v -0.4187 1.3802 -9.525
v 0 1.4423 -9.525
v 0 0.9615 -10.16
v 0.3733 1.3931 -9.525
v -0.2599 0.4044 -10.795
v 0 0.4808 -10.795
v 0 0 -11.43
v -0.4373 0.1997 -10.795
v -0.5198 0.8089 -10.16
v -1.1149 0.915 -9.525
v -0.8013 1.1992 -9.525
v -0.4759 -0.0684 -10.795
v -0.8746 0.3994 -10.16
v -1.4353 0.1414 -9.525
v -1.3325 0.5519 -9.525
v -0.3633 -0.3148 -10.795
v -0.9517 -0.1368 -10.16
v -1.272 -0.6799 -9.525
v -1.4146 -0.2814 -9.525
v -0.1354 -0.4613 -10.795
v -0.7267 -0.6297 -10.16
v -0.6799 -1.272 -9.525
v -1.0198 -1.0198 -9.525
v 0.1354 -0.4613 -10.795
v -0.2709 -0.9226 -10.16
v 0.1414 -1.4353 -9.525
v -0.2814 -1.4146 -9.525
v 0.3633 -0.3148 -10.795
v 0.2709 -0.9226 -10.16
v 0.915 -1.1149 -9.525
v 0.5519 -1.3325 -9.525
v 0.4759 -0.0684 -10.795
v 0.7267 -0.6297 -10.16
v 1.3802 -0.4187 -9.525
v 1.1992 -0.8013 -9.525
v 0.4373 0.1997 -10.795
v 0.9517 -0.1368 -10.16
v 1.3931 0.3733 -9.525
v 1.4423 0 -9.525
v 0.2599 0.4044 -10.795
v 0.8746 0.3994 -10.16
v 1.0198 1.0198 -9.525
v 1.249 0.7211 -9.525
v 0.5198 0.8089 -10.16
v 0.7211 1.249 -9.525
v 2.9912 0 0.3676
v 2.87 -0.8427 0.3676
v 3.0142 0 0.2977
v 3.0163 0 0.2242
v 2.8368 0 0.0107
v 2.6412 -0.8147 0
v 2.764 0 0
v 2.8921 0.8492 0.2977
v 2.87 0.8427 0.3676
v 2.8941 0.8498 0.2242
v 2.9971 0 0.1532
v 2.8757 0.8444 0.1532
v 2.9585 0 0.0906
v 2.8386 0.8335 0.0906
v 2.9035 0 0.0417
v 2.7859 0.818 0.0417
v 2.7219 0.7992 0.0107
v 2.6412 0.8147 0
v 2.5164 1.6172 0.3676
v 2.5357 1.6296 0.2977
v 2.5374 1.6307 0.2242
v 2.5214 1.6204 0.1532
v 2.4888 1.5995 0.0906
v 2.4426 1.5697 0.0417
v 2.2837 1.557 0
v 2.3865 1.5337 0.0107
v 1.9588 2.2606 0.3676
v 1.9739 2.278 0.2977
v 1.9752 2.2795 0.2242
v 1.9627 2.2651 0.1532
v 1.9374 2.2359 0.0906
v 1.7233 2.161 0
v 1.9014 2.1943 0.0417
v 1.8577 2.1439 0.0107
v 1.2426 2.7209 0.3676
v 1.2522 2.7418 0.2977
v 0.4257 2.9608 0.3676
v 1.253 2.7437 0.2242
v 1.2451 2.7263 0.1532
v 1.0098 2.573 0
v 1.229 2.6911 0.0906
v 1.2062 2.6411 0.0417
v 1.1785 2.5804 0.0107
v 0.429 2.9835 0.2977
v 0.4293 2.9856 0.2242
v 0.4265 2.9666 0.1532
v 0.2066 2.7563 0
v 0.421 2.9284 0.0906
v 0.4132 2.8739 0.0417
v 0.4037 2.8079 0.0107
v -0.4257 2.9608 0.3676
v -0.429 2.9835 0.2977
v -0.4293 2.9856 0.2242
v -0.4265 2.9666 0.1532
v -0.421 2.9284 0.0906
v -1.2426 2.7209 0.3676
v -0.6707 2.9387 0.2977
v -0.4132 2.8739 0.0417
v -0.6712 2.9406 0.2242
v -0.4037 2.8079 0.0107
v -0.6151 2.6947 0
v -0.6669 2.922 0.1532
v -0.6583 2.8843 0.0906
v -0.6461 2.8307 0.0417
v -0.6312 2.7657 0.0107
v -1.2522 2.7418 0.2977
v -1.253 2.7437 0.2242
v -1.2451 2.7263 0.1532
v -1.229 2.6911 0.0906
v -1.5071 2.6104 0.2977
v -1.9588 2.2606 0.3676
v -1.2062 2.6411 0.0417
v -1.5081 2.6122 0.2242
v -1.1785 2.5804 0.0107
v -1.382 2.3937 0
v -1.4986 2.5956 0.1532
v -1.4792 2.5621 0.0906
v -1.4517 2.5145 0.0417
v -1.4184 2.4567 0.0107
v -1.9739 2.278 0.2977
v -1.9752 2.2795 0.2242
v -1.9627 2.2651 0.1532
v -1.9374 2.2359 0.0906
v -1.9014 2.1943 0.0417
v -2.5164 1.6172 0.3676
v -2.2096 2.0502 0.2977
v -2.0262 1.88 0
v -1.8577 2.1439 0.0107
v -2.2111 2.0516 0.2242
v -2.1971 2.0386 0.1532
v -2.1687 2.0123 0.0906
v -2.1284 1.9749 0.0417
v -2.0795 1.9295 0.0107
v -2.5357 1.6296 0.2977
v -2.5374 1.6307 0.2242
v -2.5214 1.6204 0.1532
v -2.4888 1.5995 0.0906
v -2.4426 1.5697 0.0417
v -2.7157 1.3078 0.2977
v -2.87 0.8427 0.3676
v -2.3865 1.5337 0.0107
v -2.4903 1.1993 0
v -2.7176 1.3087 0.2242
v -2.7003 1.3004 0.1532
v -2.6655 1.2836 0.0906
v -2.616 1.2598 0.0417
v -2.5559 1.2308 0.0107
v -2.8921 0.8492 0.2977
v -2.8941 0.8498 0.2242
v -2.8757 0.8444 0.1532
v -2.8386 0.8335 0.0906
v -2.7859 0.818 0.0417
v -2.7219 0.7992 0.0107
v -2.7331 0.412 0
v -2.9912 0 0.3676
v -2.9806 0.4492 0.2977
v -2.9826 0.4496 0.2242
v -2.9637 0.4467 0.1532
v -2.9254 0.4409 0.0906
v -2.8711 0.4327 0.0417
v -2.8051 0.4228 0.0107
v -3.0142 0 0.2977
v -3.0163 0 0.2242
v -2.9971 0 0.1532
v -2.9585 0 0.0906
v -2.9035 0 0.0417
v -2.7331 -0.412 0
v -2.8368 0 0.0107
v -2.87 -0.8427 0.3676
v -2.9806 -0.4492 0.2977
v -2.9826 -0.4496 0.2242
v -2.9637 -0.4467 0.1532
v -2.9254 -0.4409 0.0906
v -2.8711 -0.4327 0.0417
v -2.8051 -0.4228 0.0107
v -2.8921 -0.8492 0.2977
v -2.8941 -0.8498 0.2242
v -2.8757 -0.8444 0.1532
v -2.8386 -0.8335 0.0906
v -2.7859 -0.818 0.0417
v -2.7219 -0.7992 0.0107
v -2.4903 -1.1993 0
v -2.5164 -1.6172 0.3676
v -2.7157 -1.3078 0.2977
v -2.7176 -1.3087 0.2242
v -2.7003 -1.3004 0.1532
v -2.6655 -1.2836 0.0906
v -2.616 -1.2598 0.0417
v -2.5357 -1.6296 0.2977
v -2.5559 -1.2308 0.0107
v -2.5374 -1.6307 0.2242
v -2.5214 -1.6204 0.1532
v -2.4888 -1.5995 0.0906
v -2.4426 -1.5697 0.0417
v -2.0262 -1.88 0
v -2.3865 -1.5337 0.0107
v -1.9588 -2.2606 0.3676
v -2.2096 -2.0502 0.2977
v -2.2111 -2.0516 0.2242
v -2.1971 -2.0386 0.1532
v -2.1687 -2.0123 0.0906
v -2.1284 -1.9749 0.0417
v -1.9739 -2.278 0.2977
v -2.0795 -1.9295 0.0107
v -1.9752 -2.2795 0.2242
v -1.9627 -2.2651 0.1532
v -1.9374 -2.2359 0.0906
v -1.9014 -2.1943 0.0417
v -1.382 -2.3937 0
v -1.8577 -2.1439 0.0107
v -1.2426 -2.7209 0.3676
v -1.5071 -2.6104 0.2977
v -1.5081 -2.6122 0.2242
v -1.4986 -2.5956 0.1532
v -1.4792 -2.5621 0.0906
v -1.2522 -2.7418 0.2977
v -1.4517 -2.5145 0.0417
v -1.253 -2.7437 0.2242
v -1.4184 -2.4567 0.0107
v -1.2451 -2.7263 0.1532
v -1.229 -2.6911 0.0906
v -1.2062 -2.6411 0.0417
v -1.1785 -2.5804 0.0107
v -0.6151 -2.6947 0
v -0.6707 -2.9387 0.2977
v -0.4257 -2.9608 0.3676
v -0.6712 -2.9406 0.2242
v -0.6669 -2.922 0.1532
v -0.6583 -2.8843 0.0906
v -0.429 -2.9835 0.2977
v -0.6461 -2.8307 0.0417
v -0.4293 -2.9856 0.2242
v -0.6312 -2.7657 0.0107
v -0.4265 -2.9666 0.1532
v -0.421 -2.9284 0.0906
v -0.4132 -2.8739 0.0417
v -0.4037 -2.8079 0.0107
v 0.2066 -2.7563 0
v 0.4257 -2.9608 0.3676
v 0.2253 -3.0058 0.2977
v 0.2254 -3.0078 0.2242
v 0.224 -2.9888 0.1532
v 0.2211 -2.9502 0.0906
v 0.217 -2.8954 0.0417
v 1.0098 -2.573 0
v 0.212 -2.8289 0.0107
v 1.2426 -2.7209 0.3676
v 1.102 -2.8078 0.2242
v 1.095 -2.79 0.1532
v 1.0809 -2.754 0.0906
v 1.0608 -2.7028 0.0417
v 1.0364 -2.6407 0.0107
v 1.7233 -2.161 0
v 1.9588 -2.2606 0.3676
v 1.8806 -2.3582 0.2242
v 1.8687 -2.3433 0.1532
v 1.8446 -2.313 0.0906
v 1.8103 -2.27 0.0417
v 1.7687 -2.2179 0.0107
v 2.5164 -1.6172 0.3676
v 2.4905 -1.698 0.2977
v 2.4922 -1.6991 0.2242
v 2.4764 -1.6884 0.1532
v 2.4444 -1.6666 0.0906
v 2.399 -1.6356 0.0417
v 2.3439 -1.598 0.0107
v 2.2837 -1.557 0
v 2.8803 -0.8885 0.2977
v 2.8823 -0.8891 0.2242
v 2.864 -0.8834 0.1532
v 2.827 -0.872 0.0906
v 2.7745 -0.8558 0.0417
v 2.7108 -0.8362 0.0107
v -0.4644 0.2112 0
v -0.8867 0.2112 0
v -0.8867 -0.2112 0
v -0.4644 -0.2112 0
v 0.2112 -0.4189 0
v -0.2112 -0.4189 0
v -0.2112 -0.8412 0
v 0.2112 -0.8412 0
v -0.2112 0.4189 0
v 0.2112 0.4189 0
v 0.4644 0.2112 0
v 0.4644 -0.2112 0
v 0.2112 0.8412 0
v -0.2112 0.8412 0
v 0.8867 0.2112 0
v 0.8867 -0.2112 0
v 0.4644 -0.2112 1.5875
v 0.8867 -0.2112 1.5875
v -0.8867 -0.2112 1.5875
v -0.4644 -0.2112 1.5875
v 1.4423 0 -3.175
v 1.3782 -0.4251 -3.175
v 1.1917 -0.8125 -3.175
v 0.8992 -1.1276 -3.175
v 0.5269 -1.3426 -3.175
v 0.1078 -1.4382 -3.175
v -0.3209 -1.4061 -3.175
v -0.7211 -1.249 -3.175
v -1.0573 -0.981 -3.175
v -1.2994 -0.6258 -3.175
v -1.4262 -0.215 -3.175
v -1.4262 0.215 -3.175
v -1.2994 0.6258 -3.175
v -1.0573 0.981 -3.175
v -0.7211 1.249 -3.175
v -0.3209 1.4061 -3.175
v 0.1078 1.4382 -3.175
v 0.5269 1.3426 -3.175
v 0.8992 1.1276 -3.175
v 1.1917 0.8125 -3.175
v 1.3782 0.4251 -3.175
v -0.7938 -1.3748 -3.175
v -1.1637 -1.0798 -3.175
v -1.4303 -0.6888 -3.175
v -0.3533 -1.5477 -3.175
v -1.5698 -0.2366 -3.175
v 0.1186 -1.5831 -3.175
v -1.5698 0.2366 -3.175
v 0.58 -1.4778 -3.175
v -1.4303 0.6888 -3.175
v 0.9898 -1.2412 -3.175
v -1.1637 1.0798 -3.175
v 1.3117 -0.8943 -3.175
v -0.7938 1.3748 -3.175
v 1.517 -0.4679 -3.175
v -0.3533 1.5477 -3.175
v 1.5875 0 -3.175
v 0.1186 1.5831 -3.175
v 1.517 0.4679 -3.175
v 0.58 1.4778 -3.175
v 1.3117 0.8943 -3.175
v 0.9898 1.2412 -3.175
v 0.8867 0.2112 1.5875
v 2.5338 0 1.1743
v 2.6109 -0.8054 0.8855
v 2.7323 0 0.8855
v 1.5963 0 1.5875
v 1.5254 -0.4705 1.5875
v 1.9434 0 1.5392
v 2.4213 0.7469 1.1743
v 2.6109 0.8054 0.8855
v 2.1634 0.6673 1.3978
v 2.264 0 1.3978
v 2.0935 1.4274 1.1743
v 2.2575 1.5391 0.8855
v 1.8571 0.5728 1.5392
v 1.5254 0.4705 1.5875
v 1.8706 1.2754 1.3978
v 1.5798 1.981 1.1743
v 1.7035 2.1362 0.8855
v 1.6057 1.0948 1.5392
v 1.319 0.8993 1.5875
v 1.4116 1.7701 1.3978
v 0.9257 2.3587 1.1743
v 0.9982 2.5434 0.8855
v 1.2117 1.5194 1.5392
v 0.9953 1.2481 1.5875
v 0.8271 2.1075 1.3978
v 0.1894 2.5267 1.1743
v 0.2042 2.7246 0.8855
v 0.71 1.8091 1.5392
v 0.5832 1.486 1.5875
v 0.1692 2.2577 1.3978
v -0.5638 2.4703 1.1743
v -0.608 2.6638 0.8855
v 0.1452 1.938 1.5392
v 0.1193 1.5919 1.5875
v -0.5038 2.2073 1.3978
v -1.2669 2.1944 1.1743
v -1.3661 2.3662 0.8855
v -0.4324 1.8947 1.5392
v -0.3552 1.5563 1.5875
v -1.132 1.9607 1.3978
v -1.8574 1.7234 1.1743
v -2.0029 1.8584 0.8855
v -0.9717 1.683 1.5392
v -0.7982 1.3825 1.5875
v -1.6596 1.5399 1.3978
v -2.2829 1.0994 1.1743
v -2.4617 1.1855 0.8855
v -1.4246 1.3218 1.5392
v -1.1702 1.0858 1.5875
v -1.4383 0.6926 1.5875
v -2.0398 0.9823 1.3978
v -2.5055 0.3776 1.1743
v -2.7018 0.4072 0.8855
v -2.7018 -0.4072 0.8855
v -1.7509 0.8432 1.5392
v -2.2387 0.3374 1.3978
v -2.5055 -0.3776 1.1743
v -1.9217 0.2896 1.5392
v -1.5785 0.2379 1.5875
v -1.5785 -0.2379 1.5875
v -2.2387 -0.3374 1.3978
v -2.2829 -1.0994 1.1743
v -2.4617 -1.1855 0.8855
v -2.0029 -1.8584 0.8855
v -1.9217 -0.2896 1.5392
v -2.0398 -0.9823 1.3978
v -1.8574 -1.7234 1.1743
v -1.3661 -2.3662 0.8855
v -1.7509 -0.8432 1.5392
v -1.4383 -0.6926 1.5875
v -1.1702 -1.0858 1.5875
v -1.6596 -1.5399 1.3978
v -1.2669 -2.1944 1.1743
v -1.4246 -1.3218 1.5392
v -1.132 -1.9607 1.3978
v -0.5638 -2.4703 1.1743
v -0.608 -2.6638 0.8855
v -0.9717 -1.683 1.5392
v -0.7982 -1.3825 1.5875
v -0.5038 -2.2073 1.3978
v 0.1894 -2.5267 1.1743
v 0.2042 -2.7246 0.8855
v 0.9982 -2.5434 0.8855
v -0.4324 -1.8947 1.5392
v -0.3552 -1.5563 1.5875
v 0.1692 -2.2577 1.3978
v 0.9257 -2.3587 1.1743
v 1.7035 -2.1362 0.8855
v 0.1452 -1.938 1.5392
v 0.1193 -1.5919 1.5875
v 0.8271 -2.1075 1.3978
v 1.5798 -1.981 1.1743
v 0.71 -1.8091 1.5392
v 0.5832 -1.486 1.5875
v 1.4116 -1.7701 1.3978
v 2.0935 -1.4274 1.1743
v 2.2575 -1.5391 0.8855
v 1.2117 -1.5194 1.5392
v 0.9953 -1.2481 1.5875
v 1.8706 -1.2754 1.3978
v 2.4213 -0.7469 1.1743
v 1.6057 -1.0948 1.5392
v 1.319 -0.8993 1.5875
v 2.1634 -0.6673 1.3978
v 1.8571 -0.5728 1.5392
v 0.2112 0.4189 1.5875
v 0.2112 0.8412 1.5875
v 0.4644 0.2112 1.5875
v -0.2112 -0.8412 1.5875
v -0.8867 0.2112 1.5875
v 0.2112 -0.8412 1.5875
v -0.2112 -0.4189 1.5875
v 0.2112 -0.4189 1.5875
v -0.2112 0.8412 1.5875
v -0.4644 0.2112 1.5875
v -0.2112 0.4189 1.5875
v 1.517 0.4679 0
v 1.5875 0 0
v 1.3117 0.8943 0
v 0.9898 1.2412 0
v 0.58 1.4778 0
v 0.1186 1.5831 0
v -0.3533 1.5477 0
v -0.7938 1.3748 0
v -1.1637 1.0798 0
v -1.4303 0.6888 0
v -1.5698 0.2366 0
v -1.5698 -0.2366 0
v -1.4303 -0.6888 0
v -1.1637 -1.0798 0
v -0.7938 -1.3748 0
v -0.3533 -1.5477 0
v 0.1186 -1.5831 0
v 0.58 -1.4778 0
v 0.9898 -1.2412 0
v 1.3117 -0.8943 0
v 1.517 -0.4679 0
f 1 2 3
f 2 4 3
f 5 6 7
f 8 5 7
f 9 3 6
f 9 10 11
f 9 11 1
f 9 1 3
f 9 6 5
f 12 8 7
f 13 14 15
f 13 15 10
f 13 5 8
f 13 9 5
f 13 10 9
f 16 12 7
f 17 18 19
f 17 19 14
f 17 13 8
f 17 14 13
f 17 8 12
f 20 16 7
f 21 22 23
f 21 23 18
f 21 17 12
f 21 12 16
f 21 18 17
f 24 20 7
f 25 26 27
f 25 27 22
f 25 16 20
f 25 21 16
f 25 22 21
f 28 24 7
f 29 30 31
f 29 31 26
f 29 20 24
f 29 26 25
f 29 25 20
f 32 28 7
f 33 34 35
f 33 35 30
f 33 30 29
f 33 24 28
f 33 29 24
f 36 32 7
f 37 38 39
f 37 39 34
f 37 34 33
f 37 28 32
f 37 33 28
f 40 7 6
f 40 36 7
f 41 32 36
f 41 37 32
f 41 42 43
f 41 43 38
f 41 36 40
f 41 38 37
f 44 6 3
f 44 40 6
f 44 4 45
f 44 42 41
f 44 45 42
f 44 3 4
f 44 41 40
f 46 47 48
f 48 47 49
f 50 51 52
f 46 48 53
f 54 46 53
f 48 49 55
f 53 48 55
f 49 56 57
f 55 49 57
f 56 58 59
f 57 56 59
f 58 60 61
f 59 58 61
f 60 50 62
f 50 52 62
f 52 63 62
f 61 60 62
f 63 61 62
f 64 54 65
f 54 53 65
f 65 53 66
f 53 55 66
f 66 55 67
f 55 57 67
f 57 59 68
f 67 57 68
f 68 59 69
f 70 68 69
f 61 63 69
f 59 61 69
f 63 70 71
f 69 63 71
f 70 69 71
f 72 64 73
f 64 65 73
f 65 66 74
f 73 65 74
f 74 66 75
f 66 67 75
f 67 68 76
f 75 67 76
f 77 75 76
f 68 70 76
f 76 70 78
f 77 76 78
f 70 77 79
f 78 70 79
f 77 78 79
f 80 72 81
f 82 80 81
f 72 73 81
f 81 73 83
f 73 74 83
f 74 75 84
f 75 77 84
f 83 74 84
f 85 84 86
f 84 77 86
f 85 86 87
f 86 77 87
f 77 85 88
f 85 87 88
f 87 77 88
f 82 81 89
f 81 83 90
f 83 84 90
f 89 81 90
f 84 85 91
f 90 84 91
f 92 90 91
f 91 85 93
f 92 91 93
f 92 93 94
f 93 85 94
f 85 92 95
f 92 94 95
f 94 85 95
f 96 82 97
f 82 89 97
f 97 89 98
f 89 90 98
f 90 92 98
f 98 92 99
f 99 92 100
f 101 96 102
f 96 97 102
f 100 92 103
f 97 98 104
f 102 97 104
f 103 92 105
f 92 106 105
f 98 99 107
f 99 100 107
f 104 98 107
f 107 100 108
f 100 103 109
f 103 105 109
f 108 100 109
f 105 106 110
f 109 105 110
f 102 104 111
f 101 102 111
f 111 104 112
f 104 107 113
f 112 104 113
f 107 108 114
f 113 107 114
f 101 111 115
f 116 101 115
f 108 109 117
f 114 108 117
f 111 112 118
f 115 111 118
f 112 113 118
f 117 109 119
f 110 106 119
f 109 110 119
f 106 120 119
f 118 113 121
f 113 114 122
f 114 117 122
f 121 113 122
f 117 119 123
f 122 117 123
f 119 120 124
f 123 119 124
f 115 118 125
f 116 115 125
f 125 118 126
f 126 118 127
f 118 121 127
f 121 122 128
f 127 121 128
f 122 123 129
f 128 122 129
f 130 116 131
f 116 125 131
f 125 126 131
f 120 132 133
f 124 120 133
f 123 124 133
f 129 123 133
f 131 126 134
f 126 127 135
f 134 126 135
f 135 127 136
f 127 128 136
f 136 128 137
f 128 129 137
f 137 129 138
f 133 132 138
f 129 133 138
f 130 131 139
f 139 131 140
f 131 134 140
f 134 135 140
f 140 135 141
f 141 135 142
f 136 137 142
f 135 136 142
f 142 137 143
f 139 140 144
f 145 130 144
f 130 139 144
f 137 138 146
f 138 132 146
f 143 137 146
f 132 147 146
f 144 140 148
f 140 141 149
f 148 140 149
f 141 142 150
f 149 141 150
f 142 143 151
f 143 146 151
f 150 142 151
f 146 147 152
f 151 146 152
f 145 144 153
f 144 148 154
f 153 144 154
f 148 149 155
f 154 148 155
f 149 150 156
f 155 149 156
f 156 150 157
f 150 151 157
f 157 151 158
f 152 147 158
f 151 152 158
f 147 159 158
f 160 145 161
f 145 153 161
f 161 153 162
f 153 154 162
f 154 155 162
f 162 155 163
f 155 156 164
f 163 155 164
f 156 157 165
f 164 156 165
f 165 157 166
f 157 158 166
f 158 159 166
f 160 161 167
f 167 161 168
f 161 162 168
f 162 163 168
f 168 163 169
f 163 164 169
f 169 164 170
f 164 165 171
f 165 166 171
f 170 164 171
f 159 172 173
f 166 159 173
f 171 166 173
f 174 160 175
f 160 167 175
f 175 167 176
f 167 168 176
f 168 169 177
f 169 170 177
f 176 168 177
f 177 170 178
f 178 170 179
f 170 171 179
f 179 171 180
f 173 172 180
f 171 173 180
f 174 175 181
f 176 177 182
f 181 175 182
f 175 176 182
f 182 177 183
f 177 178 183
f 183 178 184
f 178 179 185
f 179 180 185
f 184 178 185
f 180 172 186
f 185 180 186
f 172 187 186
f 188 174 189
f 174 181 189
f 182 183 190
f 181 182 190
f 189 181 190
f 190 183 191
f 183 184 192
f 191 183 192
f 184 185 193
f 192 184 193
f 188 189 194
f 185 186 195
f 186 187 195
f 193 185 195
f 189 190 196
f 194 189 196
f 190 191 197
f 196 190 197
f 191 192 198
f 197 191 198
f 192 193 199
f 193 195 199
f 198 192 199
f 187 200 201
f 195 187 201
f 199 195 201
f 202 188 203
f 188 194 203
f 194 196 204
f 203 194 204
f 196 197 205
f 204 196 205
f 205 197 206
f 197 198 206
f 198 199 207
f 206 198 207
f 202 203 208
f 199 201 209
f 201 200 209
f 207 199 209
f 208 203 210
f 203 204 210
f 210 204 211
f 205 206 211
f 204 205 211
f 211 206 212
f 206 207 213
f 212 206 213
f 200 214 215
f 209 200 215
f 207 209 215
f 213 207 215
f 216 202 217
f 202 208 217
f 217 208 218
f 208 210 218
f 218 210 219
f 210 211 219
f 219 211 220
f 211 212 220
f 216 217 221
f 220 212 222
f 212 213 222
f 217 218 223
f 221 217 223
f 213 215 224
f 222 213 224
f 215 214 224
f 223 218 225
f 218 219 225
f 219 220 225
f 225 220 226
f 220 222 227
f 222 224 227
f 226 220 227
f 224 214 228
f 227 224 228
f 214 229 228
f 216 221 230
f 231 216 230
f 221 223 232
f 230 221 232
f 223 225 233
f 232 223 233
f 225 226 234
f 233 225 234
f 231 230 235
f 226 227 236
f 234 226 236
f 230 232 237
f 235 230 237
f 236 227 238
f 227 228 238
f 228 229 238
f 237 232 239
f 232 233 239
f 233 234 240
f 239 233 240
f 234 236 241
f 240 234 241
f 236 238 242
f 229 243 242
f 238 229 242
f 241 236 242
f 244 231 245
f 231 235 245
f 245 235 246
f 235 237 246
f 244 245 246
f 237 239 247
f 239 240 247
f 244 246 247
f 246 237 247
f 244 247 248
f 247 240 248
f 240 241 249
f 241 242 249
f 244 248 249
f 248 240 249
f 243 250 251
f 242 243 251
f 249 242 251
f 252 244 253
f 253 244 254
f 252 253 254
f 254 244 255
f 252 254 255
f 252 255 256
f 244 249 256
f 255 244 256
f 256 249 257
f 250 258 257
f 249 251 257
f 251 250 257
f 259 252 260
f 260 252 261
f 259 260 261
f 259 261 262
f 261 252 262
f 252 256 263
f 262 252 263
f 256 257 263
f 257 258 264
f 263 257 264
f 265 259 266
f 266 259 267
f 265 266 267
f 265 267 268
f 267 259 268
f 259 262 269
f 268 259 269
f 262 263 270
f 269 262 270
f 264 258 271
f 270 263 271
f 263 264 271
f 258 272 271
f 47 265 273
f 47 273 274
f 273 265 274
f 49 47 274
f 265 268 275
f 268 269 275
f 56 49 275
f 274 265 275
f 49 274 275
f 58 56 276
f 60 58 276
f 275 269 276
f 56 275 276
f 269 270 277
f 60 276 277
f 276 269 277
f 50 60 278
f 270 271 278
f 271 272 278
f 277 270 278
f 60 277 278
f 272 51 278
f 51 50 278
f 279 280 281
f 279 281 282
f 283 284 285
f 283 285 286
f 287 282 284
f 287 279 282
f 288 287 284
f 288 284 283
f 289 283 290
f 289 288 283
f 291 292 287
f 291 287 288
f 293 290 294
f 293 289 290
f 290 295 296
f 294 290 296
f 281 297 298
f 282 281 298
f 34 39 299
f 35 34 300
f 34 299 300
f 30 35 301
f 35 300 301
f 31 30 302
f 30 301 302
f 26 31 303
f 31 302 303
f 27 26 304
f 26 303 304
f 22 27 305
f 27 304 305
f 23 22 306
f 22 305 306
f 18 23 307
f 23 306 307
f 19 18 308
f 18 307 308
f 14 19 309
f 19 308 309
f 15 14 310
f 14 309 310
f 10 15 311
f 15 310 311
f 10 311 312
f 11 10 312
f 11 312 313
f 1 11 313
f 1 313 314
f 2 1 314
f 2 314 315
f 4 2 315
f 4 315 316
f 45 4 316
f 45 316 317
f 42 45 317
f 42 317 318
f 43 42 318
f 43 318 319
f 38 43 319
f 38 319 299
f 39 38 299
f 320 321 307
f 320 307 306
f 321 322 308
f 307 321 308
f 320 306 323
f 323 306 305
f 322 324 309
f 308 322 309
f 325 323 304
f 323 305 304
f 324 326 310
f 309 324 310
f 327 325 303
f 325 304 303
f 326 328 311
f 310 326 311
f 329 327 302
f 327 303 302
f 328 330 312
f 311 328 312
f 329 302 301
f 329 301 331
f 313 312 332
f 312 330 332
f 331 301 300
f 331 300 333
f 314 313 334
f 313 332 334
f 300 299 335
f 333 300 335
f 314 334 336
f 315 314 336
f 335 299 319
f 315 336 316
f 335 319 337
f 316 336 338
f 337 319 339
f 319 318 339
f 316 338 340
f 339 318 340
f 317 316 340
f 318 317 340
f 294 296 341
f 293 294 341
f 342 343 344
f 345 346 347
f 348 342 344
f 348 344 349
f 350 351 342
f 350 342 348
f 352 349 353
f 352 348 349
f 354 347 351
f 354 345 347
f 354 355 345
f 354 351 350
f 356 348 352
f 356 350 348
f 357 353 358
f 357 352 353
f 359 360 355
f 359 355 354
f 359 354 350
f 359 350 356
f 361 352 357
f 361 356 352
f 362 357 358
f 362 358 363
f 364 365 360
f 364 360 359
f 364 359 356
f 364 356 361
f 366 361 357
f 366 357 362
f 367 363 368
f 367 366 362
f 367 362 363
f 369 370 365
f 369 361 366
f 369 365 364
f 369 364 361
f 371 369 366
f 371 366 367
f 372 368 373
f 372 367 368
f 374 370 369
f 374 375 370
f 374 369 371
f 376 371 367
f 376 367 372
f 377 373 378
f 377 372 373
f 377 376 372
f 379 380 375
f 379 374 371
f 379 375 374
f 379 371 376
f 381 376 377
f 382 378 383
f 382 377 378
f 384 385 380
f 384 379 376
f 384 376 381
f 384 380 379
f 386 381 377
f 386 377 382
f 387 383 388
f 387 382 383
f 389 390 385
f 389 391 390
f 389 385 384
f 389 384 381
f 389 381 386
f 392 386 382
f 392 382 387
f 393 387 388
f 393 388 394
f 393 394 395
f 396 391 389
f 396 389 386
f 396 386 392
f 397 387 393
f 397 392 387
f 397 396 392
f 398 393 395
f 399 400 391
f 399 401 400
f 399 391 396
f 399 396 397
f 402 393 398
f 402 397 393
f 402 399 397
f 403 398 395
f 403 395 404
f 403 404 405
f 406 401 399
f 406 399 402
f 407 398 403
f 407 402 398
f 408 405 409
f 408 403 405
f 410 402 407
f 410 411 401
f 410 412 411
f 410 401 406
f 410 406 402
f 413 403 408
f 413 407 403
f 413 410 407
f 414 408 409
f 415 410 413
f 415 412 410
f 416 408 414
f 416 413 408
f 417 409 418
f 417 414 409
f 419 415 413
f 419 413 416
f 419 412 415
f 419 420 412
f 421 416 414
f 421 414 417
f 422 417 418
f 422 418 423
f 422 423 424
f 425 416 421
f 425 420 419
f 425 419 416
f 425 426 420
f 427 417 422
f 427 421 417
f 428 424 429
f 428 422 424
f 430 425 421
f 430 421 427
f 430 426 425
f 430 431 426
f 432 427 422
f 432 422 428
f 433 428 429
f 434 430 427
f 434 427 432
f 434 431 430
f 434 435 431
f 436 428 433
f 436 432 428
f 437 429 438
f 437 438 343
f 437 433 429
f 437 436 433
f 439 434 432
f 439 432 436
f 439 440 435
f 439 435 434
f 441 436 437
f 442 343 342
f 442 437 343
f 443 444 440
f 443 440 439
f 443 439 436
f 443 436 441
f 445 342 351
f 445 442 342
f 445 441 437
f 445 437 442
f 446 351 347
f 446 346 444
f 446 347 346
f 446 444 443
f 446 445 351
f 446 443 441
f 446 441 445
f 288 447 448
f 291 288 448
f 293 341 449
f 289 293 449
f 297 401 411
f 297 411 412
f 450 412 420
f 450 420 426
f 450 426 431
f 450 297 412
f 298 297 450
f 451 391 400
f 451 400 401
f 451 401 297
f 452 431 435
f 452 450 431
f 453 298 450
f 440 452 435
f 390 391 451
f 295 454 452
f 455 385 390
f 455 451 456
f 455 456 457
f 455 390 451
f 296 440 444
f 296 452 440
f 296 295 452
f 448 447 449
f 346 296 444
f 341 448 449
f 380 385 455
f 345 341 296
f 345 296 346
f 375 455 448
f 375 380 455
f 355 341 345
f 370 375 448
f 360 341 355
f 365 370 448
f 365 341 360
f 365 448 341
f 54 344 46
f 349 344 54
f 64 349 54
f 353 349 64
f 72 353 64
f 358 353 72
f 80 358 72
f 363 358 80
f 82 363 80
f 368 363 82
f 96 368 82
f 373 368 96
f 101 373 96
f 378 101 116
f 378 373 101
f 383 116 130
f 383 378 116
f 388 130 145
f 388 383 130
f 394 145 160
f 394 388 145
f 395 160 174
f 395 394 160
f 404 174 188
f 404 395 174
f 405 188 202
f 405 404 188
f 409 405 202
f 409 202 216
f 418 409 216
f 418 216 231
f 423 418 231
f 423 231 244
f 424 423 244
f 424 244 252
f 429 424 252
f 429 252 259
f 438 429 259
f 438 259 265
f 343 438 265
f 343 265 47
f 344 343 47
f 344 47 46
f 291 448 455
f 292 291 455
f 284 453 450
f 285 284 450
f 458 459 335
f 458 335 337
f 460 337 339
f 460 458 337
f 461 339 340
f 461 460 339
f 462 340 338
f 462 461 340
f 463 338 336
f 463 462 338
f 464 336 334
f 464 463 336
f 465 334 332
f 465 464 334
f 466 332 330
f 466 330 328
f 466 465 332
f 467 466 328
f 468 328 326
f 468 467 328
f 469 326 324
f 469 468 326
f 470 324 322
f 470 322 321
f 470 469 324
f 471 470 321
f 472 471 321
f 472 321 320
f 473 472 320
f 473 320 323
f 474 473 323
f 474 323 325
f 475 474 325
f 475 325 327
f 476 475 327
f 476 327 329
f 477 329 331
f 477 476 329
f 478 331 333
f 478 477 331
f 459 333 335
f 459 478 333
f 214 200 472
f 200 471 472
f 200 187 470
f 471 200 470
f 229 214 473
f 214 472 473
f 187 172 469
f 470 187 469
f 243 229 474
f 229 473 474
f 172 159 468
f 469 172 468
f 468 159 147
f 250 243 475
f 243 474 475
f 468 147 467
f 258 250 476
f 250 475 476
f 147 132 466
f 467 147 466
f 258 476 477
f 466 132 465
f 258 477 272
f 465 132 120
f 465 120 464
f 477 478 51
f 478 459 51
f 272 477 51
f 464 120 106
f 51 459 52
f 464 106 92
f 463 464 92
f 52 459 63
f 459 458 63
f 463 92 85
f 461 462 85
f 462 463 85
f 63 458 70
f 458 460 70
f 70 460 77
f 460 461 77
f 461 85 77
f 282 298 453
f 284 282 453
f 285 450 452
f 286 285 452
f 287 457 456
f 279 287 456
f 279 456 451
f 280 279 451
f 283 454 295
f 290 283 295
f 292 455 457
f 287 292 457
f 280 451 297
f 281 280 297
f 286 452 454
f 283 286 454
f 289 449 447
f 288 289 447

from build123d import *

# Parameters (mm, degrees)
F0_R      = 3.175
F2_R      = 2.38125
F4_R      = 1.27
F5_R      = 0.254
F7_DEPTH  = 1.5875
F8_R      = 1.5875
F9_DEPTH  = 3.175
F10_R     = 1.4422766601
F11_DEPTH = 6.35


# Not quite as in the source:
# - a length typed as a fraction of an inch, garbled in the dataset ("3 / 203.2 mm" for 3/8 in), is restored


with BuildPart() as f3:
    # F0 (on Top) → F3 section 0
    with BuildSketch(Plane.XY):
        Circle(F0_R)
    # F2 (on offset) → F3 section 1
    with BuildSketch(Plane.XY.offset(1.5875)):
        Circle(F2_R)
    loft()

    # F4
    f4_edges = [f3.edges().sort_by_distance(p)[0] for p in [
        (-2.38125, 0, 1.5875),
    ]]
    fillet(f4_edges, radius=F4_R)

    # F5
    f5_edges = [f3.edges().sort_by_distance(p)[0] for p in [
        (-3.175, 0, 0),
    ]]
    fillet(f5_edges, radius=F5_R)

    # F6 (on face) → F7 (cut)
    with BuildSketch(Plane.XY.offset(1.5875)):
        Polygon((-0.2111591544, 0.8412458697), (-0.2111591544, 0.4189275609), (-0.4643816895, 0.2111591544), (-0.8866999983, 0.2111591544), (-0.8866999983, -0.2111591544), (-0.4643816895, -0.2111591544), (-0.2111591544, -0.4189275609), (-0.2111591544, -0.8412458697), (0.2111591544, -0.8412458697), (0.2111591544, -0.4189275609), (0.4643816895, -0.2111591544), (0.8866999983, -0.2111591544), (0.8866999983, 0.2111591544), (0.4643816895, 0.2111591544), (0.2111591544, 0.4189275609), (0.2111591544, 0.8412458697), align=None)
    extrude(amount=-F7_DEPTH, mode=Mode.SUBTRACT)

    # F8 (on Top) → F9 (join)
    with BuildSketch(Plane.XY):
        Circle(F8_R)
    extrude(amount=-F9_DEPTH)

    # F10 (on face) → F11 (join)
    with BuildSketch(Plane(origin=(0, 0, -3.175), x_dir=(1, 0, 0), z_dir=(0, 0, -1))):
        Circle(F10_R)
    extrude(amount=F11_DEPTH)

    # F12 (on Right) → F13 (revolve)
    with BuildSketch(Plane.YZ):
        Polygon((0, -11.43), (1.4422766601, -9.525), (0, -9.525), align=None)
    revolve(axis=Axis((0, 0, -10.4775), (0, 0, 1)))


solid = f3.part
